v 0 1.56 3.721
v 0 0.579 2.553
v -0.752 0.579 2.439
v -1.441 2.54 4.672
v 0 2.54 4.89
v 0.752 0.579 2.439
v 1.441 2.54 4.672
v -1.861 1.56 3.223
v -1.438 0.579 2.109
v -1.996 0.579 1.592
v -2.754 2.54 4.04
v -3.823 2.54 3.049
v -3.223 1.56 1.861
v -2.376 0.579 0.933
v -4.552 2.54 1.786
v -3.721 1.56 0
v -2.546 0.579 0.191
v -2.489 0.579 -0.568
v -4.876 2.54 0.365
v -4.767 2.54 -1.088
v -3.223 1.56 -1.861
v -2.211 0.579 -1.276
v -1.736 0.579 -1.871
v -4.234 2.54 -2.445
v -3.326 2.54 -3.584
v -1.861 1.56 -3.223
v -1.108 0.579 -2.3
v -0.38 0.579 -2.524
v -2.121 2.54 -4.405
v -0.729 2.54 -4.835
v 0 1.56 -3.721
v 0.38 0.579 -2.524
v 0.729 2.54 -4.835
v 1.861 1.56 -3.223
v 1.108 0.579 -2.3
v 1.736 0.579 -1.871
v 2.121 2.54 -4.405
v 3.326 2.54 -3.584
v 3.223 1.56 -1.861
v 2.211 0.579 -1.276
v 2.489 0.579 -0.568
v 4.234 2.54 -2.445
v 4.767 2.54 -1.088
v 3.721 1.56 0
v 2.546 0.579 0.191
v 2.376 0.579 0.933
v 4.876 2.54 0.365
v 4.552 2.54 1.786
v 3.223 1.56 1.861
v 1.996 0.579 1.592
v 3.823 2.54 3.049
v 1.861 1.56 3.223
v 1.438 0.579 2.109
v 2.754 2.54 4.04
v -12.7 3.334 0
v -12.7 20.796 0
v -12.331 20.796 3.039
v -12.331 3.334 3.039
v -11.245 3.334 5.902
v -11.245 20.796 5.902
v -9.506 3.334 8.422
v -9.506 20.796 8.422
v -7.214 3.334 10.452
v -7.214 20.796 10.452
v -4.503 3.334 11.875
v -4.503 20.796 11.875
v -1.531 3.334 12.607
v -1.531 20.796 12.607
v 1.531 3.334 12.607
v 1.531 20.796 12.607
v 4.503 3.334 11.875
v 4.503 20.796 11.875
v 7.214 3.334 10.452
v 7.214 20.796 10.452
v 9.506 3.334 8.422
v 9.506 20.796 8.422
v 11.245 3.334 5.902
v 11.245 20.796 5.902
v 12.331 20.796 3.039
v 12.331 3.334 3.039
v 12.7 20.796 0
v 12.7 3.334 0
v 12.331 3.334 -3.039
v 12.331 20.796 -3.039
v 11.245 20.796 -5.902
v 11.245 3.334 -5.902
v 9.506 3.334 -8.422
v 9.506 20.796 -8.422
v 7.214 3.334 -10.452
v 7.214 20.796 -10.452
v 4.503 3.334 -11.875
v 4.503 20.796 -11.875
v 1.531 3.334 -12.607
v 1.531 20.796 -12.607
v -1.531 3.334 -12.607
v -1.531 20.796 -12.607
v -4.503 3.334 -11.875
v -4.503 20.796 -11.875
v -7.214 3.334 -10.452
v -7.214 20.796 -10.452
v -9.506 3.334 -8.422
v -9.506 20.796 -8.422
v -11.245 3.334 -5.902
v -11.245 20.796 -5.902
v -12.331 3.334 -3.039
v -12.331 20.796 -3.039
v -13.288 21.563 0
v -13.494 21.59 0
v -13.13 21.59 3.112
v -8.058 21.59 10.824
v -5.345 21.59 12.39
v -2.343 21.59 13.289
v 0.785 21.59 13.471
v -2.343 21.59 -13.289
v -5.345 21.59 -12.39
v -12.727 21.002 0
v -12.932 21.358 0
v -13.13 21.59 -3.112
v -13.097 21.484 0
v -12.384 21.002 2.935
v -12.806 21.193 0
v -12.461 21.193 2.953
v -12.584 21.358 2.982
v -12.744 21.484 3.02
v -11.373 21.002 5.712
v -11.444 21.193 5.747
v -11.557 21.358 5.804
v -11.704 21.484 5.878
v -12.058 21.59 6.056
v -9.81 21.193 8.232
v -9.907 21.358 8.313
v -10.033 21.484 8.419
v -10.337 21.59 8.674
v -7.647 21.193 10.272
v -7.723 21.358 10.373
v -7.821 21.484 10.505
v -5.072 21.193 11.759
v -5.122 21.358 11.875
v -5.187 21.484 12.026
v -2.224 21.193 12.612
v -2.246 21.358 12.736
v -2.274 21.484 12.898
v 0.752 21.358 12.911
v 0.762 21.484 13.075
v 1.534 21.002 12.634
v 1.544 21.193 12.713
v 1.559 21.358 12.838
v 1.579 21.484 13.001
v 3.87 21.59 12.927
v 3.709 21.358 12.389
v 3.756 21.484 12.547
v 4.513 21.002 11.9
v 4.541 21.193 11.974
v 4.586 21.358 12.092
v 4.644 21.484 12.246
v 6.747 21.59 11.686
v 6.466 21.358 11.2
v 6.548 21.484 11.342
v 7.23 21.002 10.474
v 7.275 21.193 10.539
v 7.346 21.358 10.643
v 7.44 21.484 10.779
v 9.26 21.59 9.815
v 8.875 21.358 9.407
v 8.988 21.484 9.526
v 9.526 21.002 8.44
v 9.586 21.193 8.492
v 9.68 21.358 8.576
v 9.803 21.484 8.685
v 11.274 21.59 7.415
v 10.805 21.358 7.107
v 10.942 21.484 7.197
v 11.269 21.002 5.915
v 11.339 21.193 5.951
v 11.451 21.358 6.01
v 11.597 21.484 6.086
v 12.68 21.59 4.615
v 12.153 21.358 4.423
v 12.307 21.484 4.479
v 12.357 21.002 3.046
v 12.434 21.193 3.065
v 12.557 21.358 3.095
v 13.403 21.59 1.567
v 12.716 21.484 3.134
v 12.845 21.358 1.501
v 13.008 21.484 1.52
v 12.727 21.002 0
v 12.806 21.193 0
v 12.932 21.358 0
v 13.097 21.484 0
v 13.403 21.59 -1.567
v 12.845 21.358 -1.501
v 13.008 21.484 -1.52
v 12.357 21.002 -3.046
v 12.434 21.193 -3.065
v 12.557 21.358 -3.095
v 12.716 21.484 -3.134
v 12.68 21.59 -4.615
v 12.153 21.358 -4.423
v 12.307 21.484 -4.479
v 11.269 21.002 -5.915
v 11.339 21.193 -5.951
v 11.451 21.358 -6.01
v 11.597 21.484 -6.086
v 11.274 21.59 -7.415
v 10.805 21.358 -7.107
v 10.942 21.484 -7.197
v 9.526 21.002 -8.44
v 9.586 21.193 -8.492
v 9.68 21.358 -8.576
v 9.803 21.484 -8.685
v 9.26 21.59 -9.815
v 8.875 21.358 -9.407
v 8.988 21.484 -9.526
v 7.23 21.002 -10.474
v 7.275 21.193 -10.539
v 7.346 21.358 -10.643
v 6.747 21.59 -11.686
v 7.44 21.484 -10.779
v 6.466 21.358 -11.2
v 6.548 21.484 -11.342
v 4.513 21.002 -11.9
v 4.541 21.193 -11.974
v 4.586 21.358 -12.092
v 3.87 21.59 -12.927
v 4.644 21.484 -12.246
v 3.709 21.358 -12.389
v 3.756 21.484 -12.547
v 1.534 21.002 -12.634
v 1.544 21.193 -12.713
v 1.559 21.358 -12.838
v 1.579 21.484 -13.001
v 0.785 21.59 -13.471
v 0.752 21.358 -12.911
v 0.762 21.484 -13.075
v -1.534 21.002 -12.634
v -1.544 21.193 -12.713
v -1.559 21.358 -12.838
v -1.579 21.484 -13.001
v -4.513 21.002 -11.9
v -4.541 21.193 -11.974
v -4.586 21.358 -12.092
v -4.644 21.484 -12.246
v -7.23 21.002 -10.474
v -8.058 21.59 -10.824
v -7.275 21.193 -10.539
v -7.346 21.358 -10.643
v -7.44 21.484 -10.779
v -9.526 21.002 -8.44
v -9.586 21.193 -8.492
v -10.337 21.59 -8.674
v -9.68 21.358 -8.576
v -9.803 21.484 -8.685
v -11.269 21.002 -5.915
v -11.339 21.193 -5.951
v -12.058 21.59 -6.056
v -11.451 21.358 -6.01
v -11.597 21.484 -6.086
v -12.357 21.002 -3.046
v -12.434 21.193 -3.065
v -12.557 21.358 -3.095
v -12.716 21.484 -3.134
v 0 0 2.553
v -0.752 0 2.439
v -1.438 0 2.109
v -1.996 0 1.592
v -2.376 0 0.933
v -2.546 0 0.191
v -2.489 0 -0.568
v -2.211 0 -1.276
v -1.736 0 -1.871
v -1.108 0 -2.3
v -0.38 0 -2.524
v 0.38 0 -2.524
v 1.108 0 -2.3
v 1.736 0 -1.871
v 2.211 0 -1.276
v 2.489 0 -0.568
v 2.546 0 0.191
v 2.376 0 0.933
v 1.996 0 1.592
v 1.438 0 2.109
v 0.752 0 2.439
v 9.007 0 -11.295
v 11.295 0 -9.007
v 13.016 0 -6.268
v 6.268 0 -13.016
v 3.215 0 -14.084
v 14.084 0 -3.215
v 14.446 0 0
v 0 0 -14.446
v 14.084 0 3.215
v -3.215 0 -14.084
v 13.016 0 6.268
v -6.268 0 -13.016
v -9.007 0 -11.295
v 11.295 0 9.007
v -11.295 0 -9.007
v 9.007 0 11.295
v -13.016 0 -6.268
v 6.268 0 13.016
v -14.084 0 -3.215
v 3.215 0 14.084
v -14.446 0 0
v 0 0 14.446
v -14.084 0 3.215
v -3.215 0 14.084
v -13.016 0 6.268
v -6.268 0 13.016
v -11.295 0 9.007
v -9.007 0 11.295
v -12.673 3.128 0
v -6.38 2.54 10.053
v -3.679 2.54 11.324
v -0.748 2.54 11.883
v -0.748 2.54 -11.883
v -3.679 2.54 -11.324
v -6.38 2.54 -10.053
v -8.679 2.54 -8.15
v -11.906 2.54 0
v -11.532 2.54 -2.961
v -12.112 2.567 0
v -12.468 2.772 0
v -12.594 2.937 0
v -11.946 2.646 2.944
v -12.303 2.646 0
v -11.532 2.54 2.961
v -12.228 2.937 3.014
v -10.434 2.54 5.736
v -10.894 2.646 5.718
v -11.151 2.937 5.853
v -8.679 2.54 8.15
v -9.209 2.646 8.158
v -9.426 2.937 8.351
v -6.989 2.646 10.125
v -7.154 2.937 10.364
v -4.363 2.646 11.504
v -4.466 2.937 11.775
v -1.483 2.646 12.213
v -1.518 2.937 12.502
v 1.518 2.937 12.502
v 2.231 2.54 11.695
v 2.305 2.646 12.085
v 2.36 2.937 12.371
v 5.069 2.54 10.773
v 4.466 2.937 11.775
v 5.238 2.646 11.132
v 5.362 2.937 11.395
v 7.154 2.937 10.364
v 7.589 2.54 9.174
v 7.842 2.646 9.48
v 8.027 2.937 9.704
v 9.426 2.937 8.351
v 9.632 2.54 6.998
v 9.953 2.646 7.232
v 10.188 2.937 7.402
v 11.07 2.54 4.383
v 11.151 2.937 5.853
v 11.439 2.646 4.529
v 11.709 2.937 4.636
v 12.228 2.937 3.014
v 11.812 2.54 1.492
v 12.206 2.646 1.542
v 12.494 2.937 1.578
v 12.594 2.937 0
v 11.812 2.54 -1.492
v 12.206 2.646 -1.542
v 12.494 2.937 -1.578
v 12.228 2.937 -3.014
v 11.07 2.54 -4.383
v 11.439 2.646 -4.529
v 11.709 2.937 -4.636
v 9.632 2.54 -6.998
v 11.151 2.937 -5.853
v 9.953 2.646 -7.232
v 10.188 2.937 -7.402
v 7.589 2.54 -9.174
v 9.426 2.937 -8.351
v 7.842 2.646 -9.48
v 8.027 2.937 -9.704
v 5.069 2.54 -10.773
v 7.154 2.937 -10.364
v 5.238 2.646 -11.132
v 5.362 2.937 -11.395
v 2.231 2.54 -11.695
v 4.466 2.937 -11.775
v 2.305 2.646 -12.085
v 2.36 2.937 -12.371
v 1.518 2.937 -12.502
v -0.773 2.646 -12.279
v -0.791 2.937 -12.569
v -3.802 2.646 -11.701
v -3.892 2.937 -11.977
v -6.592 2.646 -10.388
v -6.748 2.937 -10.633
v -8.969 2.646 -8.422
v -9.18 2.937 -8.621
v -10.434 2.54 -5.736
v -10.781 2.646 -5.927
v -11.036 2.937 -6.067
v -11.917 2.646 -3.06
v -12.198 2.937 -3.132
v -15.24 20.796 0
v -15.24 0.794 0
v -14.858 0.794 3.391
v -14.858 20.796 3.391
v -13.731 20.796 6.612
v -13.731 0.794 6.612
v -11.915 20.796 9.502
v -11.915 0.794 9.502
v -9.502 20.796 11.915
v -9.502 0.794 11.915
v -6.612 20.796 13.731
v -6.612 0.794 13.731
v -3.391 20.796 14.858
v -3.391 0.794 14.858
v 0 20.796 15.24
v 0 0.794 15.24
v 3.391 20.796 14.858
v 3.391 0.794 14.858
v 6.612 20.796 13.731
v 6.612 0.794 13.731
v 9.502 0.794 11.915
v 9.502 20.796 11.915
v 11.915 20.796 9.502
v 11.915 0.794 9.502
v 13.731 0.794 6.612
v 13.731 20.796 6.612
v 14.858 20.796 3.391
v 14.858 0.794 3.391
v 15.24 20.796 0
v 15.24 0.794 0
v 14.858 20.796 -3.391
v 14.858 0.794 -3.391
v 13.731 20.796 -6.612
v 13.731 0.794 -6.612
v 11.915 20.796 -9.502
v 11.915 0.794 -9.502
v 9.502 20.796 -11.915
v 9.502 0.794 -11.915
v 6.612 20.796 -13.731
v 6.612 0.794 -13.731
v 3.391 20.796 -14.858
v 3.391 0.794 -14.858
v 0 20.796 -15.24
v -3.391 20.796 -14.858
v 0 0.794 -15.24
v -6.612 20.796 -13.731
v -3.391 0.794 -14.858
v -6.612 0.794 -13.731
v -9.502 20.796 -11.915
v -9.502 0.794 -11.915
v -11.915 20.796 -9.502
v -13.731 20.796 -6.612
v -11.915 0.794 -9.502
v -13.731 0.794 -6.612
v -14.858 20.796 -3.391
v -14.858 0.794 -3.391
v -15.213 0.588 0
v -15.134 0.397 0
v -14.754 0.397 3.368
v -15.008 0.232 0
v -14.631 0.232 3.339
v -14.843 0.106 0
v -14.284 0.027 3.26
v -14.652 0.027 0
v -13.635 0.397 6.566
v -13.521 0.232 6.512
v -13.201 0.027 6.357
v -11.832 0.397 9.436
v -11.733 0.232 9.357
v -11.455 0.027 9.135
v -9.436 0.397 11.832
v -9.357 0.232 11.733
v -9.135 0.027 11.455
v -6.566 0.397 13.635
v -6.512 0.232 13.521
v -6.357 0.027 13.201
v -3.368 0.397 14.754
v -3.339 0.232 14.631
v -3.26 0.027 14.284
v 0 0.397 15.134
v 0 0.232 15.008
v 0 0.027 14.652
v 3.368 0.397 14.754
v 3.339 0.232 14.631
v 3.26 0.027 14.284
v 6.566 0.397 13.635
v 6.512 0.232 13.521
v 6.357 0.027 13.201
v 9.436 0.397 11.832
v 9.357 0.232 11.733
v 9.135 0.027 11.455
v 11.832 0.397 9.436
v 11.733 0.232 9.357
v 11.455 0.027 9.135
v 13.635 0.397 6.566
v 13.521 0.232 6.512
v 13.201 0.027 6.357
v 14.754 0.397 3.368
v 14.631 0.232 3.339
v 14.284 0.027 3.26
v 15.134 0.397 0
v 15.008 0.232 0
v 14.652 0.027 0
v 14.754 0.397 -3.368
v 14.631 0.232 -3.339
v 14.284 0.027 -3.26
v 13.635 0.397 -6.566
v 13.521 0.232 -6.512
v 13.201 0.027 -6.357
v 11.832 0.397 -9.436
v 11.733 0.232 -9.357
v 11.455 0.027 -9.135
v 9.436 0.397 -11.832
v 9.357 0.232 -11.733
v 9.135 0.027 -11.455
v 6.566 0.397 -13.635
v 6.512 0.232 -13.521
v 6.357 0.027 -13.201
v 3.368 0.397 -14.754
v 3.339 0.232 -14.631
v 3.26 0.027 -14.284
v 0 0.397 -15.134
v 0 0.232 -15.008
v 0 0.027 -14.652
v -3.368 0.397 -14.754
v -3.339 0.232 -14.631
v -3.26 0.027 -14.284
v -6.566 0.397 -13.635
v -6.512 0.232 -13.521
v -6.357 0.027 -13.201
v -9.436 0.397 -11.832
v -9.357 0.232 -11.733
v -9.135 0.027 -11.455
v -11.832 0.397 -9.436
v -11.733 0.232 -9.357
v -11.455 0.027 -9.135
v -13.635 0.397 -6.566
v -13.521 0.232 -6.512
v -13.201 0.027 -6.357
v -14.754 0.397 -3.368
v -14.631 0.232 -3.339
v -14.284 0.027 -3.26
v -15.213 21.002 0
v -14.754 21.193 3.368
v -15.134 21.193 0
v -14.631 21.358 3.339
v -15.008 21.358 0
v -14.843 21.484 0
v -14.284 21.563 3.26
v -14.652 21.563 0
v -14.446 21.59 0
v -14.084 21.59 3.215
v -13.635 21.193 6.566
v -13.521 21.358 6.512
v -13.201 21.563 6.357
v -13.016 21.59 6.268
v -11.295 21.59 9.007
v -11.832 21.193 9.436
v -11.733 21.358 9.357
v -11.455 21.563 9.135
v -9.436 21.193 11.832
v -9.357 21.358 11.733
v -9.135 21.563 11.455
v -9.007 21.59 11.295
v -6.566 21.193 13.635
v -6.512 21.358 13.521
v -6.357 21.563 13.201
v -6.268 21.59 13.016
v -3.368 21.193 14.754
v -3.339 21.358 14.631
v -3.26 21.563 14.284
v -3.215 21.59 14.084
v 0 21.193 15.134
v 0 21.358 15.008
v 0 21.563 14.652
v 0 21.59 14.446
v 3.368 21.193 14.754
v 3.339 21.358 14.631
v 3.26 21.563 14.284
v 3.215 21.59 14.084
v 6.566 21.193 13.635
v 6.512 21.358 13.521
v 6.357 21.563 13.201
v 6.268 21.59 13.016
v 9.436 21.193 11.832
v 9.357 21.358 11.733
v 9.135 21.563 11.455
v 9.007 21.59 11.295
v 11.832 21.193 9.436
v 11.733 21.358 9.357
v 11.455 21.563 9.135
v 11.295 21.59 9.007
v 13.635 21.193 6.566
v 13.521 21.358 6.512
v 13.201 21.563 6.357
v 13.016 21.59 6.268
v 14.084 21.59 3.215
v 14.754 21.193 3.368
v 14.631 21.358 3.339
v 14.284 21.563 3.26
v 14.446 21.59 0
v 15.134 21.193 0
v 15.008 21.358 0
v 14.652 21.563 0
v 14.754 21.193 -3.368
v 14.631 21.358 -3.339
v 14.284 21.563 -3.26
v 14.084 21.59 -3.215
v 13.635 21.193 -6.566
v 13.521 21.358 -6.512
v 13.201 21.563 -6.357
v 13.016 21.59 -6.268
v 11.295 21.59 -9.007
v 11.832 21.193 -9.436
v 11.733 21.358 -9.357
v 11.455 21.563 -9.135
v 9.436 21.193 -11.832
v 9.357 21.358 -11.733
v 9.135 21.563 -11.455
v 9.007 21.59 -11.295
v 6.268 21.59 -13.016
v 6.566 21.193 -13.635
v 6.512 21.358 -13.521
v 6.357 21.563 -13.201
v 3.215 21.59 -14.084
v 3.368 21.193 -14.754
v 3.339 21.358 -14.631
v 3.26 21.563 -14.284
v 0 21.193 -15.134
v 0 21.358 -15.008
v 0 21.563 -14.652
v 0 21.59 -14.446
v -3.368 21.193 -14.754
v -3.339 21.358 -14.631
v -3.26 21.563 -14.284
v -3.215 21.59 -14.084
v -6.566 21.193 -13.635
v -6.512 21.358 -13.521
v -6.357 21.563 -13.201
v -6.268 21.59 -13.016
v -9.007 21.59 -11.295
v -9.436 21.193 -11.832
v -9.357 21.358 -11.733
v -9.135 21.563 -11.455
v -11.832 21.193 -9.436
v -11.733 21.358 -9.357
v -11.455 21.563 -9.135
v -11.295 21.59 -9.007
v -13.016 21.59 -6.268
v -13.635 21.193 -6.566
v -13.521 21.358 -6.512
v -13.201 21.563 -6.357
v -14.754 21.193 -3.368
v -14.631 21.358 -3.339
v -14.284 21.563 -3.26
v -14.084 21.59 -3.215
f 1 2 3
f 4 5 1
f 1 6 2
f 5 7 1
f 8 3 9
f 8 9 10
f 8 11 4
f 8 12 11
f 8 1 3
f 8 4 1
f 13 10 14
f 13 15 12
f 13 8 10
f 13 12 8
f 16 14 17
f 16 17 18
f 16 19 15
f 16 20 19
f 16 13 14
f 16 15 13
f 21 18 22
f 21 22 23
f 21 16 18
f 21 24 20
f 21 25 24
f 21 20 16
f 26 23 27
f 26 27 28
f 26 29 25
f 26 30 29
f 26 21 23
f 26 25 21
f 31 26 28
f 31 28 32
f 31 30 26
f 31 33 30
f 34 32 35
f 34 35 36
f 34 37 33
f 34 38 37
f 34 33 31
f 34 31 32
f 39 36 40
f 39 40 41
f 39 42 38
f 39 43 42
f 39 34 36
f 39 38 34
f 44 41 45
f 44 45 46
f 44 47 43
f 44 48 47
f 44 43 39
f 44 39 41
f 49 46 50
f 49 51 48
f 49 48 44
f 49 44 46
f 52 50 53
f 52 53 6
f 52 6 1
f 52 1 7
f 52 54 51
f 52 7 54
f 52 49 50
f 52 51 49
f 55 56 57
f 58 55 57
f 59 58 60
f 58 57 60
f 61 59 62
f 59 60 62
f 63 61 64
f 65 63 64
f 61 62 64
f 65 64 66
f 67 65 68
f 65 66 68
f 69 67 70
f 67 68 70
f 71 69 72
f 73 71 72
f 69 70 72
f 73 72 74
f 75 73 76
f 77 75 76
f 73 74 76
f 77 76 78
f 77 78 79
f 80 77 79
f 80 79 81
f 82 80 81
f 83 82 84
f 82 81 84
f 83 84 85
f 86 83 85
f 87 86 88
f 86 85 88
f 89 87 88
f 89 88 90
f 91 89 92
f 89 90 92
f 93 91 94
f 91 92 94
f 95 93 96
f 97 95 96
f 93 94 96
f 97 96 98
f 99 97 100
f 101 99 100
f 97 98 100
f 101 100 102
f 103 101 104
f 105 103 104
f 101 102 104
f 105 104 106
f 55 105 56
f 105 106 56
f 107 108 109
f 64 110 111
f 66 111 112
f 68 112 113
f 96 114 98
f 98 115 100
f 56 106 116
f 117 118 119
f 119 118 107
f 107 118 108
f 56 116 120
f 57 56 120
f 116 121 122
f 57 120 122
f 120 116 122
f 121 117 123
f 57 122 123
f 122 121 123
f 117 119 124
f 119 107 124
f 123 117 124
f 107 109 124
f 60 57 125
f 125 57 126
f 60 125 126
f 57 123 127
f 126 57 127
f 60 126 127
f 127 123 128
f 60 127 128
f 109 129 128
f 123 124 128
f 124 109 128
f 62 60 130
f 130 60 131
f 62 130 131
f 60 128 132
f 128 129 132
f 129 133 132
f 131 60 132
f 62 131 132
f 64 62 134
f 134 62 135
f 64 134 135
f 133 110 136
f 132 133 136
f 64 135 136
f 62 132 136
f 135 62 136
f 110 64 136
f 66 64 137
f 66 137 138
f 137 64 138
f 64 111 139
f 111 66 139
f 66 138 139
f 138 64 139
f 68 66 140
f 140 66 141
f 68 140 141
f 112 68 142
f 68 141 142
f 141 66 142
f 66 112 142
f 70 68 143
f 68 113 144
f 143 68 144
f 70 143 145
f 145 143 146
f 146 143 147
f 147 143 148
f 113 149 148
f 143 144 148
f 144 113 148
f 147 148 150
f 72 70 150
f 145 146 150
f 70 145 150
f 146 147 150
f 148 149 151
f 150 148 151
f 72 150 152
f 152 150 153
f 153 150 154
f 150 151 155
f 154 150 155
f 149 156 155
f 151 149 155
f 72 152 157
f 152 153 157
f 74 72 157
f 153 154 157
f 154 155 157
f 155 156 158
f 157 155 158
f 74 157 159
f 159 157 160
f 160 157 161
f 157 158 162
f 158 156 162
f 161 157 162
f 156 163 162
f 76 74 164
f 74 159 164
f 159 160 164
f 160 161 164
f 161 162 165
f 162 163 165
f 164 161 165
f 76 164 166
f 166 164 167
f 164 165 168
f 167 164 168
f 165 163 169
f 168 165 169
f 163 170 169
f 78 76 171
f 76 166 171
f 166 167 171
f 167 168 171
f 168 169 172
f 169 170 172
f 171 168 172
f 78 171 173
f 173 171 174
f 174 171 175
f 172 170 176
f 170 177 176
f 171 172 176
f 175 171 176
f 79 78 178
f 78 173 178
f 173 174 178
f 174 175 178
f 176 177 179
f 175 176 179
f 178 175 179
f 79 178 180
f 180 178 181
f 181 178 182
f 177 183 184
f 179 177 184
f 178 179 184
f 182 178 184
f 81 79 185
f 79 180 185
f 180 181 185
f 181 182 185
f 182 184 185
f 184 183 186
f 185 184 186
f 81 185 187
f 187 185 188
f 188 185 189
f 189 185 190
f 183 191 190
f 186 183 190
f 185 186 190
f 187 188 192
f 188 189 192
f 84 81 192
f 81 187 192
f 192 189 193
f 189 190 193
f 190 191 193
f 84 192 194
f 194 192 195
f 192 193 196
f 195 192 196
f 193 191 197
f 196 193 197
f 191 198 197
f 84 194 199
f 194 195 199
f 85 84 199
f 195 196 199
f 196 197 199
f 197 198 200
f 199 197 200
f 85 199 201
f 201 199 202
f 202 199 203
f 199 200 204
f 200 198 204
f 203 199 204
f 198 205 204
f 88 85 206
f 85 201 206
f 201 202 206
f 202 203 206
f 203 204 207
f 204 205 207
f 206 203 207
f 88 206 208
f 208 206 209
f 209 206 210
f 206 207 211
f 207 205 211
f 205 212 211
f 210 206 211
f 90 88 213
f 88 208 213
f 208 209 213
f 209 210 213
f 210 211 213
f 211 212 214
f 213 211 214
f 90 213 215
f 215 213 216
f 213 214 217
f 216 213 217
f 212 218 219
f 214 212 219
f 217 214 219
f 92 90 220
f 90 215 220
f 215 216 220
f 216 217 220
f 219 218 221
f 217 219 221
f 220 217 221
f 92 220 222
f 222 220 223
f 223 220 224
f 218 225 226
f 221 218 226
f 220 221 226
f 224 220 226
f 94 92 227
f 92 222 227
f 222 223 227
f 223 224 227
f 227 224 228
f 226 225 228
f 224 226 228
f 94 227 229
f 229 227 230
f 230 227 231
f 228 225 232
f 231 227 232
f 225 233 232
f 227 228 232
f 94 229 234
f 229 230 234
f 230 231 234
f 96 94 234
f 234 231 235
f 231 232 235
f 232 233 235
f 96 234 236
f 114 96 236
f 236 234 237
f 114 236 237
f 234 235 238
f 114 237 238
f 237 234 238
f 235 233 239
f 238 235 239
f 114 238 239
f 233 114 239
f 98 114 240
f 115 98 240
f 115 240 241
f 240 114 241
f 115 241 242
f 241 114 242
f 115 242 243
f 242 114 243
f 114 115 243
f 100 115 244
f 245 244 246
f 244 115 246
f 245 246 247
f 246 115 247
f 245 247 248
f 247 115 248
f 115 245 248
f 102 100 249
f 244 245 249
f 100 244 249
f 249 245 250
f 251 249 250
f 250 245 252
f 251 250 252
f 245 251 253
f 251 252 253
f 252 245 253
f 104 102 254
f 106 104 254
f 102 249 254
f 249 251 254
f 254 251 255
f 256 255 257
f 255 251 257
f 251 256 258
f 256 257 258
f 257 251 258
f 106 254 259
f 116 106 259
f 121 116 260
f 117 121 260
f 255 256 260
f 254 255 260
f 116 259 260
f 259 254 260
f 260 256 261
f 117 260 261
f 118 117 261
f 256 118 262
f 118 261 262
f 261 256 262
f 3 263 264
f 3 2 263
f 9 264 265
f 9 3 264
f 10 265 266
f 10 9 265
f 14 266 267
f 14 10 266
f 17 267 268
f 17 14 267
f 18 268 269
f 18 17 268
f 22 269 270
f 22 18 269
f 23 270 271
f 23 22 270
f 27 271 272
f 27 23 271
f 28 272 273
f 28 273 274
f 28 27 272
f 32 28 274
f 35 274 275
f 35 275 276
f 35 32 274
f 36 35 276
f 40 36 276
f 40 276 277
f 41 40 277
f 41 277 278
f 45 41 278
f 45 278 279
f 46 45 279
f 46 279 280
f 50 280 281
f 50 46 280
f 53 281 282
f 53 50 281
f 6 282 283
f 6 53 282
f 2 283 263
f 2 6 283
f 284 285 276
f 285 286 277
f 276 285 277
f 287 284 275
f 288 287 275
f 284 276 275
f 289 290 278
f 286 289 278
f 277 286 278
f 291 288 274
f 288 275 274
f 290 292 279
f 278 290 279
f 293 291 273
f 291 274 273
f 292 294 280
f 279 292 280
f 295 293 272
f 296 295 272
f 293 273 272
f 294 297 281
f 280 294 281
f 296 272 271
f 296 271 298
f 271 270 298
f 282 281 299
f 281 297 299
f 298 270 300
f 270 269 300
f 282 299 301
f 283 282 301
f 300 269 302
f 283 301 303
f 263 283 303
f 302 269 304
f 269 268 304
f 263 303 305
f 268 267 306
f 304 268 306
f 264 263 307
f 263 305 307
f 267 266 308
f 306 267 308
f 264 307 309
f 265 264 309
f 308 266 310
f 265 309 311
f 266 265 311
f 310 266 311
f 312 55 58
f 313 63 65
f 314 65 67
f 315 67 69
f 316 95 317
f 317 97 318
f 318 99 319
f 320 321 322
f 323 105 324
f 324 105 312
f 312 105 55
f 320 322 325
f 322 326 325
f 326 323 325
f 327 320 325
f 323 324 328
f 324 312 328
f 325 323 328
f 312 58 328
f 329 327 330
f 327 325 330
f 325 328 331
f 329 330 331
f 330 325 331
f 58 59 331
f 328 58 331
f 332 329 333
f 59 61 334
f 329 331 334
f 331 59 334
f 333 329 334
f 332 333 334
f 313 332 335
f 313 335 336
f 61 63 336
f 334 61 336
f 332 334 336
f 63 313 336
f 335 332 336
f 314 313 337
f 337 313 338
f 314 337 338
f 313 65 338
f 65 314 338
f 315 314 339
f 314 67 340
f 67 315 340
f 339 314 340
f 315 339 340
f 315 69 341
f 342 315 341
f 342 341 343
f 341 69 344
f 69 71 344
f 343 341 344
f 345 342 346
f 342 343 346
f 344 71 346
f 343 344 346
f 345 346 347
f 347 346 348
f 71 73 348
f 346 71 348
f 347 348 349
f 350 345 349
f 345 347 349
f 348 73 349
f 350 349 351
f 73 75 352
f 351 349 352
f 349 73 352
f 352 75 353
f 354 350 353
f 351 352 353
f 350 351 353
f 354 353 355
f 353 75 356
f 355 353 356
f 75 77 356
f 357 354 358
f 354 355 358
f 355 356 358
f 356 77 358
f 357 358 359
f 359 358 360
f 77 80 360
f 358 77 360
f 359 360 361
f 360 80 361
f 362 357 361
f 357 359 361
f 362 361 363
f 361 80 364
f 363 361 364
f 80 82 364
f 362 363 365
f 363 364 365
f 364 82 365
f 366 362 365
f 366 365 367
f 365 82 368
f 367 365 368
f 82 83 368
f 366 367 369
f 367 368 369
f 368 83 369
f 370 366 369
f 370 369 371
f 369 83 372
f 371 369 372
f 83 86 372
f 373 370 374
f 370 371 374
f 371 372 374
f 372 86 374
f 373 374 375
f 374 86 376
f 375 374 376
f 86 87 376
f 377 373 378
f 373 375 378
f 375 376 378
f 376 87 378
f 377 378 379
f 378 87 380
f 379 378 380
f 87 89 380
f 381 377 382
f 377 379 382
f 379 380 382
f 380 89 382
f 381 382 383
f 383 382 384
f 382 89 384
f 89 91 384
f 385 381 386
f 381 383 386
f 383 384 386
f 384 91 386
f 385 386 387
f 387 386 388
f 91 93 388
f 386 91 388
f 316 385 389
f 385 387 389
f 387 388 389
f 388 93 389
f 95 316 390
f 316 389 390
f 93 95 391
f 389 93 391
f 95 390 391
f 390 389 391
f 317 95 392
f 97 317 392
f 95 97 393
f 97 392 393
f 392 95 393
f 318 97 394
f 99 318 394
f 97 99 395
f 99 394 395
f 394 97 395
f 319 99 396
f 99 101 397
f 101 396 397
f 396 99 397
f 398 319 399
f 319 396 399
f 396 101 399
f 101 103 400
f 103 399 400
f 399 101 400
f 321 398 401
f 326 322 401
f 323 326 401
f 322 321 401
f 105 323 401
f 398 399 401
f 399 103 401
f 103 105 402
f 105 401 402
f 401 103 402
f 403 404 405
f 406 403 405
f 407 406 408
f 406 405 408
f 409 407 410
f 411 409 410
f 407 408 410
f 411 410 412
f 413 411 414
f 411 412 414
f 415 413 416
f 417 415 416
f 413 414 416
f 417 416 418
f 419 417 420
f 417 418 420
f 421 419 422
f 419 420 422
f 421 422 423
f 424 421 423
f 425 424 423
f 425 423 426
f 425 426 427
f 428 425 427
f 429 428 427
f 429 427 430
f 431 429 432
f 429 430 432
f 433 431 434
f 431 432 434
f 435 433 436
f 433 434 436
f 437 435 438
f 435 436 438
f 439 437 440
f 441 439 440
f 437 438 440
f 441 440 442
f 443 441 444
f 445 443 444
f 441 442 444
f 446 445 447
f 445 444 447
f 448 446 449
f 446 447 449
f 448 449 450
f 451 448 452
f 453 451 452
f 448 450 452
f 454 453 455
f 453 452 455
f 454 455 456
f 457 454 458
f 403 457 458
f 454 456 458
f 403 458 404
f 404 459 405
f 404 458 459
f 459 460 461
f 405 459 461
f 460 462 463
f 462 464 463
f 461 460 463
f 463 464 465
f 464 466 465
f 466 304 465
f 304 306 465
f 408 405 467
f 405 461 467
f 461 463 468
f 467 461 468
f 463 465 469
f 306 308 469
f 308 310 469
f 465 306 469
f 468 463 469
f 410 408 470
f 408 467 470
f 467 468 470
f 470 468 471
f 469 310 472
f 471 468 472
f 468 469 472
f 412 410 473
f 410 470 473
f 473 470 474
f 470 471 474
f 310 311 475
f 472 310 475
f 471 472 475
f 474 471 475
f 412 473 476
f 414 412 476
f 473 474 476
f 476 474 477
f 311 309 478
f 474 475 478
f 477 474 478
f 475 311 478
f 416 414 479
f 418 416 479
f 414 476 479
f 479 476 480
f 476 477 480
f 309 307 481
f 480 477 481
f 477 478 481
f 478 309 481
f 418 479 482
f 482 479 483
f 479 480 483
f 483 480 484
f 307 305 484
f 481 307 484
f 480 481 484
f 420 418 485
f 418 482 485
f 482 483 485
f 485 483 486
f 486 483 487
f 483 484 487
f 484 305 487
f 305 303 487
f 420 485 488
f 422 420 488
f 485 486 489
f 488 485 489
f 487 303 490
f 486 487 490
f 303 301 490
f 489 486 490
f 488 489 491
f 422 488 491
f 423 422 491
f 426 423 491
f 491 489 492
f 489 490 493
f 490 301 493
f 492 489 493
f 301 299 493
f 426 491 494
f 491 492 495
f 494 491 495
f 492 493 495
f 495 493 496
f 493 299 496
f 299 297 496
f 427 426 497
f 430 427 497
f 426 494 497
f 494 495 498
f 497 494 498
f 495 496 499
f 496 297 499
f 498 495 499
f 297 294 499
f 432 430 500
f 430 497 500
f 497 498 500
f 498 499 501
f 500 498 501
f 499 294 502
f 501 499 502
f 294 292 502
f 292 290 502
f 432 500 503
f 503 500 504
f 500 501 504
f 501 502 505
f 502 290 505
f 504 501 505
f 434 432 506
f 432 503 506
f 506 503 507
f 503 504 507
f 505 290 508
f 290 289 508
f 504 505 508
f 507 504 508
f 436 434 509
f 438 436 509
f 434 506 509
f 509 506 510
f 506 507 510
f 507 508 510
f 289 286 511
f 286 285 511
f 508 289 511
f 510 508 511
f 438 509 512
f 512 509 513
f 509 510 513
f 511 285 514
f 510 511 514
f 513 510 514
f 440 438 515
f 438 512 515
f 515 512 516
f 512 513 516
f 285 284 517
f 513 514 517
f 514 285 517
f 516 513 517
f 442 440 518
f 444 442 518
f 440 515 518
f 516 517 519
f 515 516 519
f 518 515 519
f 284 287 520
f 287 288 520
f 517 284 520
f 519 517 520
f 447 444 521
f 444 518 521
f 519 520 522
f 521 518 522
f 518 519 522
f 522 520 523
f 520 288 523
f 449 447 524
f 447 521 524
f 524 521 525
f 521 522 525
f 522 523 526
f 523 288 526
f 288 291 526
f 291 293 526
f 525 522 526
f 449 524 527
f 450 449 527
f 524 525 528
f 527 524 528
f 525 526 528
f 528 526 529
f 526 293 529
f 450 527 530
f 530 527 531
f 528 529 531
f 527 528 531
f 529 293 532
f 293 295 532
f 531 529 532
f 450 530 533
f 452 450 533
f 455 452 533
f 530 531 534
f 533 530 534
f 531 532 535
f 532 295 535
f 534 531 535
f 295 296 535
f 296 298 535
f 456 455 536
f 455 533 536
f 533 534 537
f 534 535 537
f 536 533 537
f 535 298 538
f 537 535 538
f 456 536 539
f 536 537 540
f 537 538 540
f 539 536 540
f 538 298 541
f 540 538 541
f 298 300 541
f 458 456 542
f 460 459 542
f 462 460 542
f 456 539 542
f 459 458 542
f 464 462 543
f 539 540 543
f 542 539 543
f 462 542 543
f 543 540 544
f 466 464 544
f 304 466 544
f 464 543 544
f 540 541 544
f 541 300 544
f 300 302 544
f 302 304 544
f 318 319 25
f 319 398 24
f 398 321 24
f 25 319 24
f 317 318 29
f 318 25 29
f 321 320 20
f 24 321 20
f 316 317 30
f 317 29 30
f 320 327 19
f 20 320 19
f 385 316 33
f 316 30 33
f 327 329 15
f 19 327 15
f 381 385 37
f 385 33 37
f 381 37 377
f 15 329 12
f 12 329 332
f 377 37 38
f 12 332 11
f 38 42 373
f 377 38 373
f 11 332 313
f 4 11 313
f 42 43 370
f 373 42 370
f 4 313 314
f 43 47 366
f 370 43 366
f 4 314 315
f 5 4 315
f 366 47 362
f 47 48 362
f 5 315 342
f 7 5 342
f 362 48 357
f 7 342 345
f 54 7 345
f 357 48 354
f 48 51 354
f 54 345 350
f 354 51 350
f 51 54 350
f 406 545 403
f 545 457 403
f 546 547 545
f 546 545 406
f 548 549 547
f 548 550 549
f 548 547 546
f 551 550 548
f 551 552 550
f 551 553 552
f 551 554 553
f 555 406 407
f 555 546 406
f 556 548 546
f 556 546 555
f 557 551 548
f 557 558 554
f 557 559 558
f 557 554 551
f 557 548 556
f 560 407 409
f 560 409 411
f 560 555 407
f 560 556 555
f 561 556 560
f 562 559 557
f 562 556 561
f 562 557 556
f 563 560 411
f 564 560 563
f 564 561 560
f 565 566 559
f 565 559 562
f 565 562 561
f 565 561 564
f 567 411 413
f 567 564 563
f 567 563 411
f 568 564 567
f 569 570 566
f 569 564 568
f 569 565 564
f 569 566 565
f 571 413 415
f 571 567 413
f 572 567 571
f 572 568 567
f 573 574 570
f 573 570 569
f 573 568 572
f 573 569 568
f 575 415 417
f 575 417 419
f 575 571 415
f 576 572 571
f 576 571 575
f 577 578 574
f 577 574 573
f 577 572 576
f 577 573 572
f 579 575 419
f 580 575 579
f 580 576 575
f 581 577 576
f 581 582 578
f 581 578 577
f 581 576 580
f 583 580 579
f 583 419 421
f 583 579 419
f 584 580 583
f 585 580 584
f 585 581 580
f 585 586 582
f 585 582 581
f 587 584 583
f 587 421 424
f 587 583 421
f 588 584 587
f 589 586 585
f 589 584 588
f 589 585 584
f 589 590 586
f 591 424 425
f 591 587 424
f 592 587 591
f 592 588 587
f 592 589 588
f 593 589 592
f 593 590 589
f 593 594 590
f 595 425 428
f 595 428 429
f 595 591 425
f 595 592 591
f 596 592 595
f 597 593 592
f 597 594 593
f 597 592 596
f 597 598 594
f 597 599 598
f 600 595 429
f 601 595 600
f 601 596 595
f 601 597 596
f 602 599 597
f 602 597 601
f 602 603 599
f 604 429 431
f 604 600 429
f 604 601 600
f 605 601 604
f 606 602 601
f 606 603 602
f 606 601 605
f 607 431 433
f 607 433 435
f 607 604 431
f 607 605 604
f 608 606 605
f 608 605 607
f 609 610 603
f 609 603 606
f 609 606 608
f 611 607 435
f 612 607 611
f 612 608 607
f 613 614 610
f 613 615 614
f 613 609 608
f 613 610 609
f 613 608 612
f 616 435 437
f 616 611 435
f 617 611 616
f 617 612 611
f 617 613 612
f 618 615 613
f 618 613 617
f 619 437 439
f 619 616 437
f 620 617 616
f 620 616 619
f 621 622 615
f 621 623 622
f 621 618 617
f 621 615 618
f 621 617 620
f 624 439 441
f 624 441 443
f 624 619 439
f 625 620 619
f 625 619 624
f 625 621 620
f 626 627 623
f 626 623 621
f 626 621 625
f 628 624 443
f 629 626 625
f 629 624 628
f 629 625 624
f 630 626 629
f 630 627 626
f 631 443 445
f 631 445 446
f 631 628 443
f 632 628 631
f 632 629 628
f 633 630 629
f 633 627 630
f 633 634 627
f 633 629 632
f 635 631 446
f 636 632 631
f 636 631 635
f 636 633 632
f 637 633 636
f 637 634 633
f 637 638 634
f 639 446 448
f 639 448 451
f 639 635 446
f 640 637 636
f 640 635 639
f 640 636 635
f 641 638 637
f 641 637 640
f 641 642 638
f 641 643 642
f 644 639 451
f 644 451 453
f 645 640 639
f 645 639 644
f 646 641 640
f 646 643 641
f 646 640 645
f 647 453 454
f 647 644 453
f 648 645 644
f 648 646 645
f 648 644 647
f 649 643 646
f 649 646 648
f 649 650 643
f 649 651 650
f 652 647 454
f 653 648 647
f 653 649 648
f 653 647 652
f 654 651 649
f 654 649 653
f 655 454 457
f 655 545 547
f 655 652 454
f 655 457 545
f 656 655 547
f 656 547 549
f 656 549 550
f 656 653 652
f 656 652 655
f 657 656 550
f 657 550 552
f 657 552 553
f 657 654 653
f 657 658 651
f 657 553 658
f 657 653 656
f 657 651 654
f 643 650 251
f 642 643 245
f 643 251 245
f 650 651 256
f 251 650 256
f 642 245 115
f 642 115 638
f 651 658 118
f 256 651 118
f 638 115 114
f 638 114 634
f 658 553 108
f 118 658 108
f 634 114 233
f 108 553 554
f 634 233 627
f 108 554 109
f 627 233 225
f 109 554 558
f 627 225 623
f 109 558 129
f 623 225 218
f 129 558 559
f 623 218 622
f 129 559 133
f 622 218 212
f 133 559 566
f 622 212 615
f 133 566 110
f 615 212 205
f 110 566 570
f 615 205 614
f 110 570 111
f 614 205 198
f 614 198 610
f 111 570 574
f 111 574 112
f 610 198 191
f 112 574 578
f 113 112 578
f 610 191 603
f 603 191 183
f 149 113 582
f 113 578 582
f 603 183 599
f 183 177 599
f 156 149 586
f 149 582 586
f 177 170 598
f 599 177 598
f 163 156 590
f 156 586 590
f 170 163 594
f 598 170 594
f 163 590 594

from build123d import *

# Parameters (mm, degrees)
FILLET1_R = 0.79375


with BuildPart() as part:
    # Sketch1 → Revolve1 (revolve)
    with BuildSketch(Plane.XY):
        Polygon((-15.24, 21.59), (-15.24, 0), (0, 0), (0, 2.54), (-12.7, 2.54), (-12.7, 21.59), align=None)
    revolve(axis=Axis((0, 0, 0), (0, 1, 0)))

    # Fillet1
    fillet1_edges = [part.edges().sort_by_distance(p)[0] for p in [
        (12.7, 21.59, 0),
        (12.7, 2.54, 0),
        (15.24, 0, 0),
        (15.24, 21.59, 0),
    ]]
    fillet(fillet1_edges, radius=FILLET1_R)

    # Sketch4 → CSK for #10 Flat Head Machine Screw (100)1 (revolve, cut)
    with BuildSketch(Plane(origin=(0, 2.54, 0), x_dir=(0, 0, 1), z_dir=(1, 0, 0))):
        Polygon((0, 0), (0, 2.54), (2.5527, 2.54), (2.5527, 1.960808018), (4.8895, 0), align=None)
    revolve(axis=Axis((0, 8.89, 0), (0, -1, 0)), mode=Mode.SUBTRACT)


solid = part.part
